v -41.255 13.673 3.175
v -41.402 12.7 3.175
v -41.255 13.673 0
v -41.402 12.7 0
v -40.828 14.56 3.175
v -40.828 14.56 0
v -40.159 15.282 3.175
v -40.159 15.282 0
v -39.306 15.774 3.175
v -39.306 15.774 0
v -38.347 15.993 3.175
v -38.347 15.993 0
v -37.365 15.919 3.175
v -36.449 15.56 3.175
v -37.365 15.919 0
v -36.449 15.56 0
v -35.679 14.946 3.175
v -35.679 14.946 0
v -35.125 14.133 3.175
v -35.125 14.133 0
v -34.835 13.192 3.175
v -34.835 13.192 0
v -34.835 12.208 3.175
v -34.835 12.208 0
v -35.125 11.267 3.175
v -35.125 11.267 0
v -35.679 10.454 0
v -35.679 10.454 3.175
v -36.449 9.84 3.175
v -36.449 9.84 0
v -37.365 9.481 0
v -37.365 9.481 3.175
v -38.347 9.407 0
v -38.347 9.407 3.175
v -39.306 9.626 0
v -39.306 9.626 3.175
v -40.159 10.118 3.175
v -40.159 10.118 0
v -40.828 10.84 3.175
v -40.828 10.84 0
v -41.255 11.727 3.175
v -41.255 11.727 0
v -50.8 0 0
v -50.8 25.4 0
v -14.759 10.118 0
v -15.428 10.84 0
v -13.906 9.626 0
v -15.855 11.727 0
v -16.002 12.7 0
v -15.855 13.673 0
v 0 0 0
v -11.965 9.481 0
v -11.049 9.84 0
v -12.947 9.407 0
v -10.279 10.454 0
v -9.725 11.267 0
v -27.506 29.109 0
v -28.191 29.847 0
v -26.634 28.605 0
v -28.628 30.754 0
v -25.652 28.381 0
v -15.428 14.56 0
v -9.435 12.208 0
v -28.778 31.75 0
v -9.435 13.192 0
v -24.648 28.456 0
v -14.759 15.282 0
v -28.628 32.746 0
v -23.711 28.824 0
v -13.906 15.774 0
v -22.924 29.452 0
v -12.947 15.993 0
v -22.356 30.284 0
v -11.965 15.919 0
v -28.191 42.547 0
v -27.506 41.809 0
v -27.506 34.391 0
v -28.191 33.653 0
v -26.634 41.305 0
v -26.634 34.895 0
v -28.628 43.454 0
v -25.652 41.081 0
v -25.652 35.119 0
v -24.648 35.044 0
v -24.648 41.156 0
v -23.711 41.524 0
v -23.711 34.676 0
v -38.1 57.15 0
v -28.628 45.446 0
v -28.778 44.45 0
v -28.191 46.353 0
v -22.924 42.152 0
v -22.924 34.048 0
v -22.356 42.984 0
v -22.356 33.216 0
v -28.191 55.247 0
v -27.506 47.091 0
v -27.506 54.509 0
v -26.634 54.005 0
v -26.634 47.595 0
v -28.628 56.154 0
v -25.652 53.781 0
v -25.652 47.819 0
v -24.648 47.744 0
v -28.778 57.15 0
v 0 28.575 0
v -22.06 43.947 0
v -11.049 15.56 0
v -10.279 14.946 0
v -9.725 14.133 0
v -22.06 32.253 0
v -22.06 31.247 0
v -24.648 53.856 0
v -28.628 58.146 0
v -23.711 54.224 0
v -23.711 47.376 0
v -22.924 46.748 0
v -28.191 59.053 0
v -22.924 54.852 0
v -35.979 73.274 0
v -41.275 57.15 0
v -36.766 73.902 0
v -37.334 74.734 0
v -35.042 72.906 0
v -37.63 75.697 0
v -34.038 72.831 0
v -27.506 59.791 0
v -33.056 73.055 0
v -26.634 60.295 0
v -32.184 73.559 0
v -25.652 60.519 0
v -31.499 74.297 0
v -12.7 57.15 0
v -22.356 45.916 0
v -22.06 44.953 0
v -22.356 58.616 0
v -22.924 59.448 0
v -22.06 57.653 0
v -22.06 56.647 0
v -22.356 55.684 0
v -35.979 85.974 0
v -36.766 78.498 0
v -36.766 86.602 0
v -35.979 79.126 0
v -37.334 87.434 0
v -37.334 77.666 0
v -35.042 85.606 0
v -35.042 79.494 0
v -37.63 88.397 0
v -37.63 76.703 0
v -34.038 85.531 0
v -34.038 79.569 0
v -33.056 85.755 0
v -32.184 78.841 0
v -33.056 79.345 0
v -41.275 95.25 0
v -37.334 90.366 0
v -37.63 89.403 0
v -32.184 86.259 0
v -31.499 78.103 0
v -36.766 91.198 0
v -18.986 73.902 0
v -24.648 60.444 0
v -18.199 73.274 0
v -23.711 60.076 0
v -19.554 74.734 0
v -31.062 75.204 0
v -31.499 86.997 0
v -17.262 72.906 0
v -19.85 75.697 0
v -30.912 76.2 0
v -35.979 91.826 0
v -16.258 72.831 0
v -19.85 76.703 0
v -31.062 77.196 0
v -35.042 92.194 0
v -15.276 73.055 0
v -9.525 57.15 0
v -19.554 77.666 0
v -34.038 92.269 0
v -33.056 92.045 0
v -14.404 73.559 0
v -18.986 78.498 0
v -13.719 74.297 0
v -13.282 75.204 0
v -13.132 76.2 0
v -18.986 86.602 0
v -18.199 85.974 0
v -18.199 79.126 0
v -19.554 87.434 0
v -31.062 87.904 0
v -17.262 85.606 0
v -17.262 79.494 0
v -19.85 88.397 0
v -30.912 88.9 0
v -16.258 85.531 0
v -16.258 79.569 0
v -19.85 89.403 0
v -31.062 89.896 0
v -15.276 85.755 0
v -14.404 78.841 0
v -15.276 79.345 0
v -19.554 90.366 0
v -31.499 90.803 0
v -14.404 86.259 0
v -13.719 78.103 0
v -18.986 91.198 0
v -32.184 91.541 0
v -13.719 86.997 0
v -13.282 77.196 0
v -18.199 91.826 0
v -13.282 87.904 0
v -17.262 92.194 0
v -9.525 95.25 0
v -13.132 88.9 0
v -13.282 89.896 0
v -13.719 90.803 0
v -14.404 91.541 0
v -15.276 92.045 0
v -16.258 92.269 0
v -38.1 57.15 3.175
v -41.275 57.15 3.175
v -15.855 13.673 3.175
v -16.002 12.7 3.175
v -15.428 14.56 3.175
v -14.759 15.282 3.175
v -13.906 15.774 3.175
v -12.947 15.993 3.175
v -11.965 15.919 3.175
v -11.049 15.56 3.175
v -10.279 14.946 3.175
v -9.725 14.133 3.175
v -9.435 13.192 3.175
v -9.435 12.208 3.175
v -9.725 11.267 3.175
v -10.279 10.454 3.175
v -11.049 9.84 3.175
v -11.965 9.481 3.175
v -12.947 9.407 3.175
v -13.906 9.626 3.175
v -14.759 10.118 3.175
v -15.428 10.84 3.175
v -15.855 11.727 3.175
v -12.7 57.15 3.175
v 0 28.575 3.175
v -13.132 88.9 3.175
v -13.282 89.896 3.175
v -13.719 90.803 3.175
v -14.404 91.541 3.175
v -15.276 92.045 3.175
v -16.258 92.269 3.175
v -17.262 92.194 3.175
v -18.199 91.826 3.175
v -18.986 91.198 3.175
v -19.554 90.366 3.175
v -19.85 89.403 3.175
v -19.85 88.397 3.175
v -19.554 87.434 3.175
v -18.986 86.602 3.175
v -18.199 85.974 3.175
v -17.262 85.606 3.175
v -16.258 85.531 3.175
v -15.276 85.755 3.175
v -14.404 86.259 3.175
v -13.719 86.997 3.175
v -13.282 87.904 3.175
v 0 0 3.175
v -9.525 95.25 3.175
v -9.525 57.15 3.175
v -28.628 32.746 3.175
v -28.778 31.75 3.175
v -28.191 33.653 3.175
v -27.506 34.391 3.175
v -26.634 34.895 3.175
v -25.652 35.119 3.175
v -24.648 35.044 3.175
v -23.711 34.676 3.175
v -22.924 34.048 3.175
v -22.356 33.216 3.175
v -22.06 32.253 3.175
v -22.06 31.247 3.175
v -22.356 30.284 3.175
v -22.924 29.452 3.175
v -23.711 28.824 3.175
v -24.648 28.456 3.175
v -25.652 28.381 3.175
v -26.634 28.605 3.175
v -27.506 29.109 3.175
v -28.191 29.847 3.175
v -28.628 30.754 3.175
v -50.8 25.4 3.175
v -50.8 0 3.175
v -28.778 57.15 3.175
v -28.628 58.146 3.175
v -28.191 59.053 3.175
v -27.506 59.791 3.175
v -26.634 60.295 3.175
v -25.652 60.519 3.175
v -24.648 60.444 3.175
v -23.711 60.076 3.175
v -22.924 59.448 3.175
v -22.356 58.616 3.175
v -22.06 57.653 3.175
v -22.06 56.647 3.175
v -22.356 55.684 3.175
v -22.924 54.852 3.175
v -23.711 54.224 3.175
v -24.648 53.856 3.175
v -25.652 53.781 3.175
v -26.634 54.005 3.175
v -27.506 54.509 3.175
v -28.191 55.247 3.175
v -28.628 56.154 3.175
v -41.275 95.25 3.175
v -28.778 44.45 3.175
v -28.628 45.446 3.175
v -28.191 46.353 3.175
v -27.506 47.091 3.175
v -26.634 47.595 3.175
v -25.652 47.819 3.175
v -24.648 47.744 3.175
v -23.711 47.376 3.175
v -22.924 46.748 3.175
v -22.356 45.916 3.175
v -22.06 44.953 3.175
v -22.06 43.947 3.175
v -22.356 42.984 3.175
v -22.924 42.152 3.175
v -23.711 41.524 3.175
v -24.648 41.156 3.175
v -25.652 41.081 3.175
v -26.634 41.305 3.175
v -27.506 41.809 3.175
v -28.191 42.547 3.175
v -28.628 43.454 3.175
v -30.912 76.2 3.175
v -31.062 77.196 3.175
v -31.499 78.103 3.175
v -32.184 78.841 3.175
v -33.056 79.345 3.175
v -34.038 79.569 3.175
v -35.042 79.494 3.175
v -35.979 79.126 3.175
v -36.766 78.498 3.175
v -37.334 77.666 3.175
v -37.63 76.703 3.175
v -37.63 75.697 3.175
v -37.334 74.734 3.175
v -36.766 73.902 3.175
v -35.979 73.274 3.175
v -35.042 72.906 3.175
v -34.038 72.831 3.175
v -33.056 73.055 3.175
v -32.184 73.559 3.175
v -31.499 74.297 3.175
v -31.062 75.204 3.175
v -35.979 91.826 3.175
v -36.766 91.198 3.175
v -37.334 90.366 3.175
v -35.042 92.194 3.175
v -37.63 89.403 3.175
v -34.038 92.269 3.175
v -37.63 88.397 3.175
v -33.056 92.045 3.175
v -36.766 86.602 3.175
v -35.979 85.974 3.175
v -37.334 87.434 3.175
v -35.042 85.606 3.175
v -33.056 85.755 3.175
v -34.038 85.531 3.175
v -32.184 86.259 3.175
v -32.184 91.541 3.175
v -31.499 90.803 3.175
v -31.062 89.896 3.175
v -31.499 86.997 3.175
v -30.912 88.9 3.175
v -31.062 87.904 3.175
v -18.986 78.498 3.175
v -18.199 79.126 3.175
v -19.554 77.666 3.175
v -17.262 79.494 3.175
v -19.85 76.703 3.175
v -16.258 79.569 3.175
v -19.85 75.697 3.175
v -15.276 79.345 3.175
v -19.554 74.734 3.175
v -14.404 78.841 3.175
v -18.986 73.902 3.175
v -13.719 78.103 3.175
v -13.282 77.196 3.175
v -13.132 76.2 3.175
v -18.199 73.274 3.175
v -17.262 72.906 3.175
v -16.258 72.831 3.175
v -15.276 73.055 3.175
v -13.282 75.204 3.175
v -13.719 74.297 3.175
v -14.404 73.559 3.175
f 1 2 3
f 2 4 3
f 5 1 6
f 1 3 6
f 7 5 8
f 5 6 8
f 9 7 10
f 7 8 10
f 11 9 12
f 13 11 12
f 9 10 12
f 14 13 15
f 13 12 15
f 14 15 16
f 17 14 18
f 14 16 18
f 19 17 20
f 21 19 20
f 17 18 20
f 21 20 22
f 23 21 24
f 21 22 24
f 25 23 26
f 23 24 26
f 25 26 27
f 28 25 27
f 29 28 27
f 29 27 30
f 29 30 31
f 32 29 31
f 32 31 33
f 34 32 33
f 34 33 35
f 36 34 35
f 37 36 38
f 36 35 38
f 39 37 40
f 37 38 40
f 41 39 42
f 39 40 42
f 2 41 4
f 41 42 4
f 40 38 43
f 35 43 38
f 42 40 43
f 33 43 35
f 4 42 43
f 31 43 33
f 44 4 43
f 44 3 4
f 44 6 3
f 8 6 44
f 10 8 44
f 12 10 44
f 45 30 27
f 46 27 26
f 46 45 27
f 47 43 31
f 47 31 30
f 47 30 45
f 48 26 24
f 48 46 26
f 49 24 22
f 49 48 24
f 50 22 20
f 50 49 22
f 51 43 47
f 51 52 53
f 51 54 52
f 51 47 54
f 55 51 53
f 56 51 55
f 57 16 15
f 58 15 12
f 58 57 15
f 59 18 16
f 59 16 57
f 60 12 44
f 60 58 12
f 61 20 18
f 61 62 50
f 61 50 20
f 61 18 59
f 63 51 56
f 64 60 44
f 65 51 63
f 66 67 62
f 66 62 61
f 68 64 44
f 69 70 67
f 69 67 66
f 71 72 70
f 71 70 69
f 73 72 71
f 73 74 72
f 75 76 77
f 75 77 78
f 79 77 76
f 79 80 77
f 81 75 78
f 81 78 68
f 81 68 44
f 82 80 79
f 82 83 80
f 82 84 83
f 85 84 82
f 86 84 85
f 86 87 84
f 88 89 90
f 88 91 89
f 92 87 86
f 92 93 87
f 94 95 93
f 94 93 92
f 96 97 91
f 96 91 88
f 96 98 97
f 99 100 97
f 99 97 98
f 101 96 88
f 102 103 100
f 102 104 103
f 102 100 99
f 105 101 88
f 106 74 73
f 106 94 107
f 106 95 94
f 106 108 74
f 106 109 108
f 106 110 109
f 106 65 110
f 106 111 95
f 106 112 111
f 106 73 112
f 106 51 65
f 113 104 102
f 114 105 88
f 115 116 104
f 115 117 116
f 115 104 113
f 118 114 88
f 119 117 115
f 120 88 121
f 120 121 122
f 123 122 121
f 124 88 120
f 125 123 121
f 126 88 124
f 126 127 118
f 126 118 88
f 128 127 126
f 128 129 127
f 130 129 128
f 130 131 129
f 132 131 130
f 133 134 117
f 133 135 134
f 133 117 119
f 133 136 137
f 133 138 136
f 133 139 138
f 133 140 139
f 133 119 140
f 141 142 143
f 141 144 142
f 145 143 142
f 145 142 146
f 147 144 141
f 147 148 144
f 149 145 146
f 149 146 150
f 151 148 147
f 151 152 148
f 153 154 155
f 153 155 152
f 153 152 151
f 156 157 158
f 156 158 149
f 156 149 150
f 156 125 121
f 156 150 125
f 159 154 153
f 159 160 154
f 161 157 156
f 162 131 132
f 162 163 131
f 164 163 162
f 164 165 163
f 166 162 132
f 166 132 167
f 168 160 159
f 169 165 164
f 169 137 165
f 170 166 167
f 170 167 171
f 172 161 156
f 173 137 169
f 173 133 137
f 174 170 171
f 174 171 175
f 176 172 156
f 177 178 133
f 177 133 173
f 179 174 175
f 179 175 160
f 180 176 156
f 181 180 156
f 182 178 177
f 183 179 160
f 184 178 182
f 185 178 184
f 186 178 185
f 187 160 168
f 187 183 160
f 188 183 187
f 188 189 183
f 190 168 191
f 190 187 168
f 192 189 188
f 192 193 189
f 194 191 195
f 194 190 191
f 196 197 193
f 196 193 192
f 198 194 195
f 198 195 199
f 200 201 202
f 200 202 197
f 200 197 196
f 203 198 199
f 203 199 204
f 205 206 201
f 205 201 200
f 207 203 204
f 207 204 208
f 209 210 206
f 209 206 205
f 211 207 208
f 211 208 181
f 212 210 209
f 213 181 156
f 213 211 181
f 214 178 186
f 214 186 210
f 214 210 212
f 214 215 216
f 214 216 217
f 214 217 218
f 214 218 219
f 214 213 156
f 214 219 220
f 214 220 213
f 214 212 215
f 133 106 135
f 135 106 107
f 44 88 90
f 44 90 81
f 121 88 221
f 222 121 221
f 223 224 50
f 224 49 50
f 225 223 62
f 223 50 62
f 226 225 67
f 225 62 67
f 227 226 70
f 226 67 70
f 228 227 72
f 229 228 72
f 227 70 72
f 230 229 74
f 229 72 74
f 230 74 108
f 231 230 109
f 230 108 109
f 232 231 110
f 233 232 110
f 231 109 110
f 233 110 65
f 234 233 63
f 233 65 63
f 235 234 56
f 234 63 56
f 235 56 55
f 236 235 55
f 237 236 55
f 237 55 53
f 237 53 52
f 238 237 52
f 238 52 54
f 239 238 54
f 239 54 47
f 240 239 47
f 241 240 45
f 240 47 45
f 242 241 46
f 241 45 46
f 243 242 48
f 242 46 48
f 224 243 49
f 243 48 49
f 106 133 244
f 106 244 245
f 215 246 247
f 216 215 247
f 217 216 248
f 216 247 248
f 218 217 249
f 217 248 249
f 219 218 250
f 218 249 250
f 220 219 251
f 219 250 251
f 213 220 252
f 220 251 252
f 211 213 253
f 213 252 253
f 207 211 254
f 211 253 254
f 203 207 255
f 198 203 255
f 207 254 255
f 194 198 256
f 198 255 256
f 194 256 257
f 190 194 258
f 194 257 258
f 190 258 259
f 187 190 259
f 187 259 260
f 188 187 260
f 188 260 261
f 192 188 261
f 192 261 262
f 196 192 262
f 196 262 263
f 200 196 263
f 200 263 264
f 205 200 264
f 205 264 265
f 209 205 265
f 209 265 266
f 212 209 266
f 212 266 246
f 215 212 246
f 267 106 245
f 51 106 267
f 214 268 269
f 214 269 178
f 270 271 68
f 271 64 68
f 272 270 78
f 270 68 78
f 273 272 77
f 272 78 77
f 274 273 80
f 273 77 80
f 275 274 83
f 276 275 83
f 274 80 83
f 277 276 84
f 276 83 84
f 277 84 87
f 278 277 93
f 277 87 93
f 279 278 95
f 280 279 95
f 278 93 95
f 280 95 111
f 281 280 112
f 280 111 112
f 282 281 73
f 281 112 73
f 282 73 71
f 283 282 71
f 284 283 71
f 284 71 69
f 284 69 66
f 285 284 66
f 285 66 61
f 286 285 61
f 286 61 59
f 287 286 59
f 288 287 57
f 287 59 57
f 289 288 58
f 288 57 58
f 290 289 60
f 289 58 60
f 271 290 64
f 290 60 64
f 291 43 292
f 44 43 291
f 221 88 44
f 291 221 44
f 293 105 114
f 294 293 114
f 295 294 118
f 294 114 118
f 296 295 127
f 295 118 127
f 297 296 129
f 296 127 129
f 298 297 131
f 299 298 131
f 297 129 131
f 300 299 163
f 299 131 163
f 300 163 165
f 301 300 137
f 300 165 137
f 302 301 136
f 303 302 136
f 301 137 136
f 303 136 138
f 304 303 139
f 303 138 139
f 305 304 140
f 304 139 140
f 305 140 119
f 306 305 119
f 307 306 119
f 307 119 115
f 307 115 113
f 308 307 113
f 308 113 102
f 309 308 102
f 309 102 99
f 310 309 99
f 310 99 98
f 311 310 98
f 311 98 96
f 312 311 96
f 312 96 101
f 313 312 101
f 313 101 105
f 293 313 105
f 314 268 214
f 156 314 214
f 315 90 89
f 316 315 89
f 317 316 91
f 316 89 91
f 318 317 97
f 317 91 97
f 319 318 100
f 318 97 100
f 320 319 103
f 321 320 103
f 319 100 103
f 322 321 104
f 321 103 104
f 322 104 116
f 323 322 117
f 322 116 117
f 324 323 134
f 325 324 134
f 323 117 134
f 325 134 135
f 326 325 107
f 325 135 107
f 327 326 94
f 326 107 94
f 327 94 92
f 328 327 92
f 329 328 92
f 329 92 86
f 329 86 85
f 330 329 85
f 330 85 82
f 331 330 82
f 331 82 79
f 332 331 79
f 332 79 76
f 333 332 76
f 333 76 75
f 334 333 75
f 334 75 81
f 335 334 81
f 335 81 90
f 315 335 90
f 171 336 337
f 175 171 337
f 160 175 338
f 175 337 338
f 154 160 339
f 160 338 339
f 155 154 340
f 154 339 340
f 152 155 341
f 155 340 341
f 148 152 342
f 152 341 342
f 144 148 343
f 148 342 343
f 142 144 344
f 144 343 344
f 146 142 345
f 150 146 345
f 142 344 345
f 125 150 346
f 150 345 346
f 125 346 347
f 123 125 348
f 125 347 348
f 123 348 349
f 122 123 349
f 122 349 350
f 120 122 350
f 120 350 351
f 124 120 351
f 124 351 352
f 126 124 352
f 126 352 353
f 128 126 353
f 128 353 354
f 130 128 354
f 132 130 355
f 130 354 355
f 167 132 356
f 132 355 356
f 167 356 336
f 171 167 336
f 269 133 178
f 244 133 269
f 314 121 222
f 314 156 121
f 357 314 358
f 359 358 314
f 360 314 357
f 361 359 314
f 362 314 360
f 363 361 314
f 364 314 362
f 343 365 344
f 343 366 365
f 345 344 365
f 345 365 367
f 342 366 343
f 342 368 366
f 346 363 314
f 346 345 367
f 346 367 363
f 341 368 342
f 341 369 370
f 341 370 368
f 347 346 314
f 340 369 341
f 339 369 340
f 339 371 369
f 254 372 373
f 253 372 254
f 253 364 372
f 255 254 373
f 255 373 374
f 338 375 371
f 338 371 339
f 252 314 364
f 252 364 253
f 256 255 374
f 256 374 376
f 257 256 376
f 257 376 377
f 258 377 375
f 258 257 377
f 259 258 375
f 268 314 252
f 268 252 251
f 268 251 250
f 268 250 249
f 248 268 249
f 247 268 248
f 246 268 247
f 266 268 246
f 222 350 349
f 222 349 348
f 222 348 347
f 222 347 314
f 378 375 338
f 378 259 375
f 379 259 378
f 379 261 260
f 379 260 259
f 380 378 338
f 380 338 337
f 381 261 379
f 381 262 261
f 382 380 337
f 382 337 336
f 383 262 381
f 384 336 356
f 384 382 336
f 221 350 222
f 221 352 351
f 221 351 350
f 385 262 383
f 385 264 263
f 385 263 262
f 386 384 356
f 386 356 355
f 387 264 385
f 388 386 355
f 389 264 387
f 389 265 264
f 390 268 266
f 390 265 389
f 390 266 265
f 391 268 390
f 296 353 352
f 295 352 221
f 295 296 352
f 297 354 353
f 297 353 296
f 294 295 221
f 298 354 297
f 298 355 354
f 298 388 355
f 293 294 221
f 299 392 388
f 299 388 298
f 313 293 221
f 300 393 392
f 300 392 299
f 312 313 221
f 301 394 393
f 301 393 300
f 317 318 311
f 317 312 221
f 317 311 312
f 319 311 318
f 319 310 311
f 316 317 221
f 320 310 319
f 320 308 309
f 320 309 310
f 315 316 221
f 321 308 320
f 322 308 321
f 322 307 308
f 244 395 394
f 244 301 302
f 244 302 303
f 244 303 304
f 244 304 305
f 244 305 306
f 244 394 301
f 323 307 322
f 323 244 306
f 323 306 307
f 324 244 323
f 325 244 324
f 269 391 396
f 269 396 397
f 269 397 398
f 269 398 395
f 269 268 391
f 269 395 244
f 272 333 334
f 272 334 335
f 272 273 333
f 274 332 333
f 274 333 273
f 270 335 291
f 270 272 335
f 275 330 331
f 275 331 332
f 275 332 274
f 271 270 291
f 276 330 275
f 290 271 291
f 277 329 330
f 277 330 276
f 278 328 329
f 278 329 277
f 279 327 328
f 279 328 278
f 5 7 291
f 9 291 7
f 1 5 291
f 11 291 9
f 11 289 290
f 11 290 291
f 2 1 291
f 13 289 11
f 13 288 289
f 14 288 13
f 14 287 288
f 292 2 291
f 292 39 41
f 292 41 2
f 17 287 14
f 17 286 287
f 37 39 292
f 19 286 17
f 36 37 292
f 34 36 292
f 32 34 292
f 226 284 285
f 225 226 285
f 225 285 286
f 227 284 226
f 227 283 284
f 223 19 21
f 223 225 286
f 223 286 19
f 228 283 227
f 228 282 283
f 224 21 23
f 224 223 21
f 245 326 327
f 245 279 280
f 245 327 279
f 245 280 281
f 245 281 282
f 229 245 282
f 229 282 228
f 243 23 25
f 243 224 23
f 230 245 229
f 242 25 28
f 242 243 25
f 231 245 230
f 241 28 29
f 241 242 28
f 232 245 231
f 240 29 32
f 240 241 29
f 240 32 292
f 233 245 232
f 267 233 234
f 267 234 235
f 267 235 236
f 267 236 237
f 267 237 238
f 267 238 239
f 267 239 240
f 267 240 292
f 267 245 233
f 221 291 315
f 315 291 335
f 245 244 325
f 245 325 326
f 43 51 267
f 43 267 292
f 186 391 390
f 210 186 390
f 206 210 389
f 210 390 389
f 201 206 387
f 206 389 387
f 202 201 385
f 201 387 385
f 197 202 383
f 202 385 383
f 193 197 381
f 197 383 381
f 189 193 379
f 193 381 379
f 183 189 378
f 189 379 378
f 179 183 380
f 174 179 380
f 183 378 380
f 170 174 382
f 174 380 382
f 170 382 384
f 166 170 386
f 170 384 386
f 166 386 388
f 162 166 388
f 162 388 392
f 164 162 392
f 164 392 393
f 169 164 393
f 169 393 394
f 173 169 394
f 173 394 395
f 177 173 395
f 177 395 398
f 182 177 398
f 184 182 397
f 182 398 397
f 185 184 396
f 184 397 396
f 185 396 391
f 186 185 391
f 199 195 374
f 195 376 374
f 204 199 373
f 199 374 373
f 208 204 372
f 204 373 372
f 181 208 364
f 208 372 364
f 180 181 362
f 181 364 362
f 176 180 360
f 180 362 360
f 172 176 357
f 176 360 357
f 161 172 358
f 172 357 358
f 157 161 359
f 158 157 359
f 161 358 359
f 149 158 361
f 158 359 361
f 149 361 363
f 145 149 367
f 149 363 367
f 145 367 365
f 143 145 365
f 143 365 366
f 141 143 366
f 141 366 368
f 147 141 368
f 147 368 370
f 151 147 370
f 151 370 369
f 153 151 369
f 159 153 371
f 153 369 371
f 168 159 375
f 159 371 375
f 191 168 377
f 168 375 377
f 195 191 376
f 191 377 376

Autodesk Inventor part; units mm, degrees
ref_plane "YZ Plane" through (0, 0, 0) normal (1, 0, 0) x (0, 1, 0)
ref_plane "XZ Plane" through (0, 0, 0) normal (0, 1, 0) x (-1, 0, 0)
ref_plane "XY Plane" through (0, 0, 0) normal (0, 0, 1) x (1, 0, 0)
sketch "Sketch1" plane through (0, 0, 0) normal (0, 0, 1) x (1, 0, 0)
  line L0 (0, 0) -> (-50.8, 0)
  line L1 (-50.8, 0) -> (-50.8, 57.15)
  line L2 (-50.8, 57.15) -> (0, 57.15)
  line L3 (0, 57.15) -> (0, 0)
  line L4 (-50.8, 0) -> (-50.8, 25.4)
  line L5 (0, 0) -> (0, 25.4)
  line L6 (-25.4, 57.15) -> (-38.1, 57.15)
  line L7 (-25.4, 57.15) -> (-12.7, 57.15)
  line L8 (-12.7, 57.15) -> (0, 28.575)
  line L9 (-38.1, 57.15) -> (-50.8, 25.4)
  dimension "d0" = 50.8
  dimension "d1" = 57.15
  dimension "d2" = 25.4
  dimension "d3" = 12.7
  dimension "d4" = 12.7
extrude "Extrusion1" add sketch "Sketch1" along normal blind 3.175 contours L0 L1 L9 L2 L8 L3
sketch "Sketch2" plane through (0, 0, 3.175) normal (0, 0, 1) x (1, 0, 0)
  line L0 (-12.7, 57.15) -> (-38.1, 57.15) projected
  line L1 (-50.8, 0) -> (0, 0) projected
  line L2 (-38.1, 57.15) -> (-38.1, 95.25)
  line L3 (-38.1, 95.25) -> (-12.7, 95.25)
  line L4 (-12.7, 95.25) -> (-12.7, 57.15)
  dimension "d7" = 38.1
extrude "Extrusion2" add sketch "Sketch2" against normal blind 3.175
sketch "Sketch3" plane through (0, 0, 0) normal (0, 0, -1) x (-1, 0, 0)
  circle A0 centre (25.4, 57.15) radius 3.3782 projected
  circle A1 centre (25.4, 44.45) radius 3.3782 projected
  circle A2 centre (25.4, 31.75) radius 3.3782 projected
  circle A3 centre (12.7, 12.7) radius 3.302 projected
  circle A4 centre (38.1, 12.7) radius 3.302 projected
extrude "Extrusion3" cut sketch "Sketch3" against normal blind 3.175
sketch "Sketch4" plane through (0, 0, 3.175) normal (0, 0, 1) x (1, 0, 0)
  line L0 (-12.7, 95.25) -> (-38.1, 95.25) projected
  line L1 (-38.1, 95.25) -> (-34.29, 95.25)
  line L2 (-34.29, 95.25) -> (-34.29, 88.9)
  line L3 (-34.29, 88.9) -> (-34.29, 76.2)
  line L4 (-12.7, 95.25) -> (-16.51, 95.25)
  line L5 (-16.51, 95.25) -> (-16.51, 88.9)
  line L6 (-16.51, 88.9) -> (-16.51, 82.55)
  circle A0 centre (-34.29, 88.9) radius 3.3782
  circle A1 centre (-16.51, 88.9) radius 3.3782
  circle A2 centre (-34.29, 76.2) radius 3.3782
  line L7 (-16.51, 88.9) -> (-16.51, 76.2)
  circle A3 centre (-16.51, 76.2) radius 3.3782
  dimension "d12" = 3.81
  dimension "d13" = 6.35
  dimension "d14" = 12.7
  dimension "d15" = 3.81
  dimension "d16" = 6.7564
  dimension "d17" = 6.7564
  dimension "d18" = 6.7564
  dimension "d19" = 6.7564
extrude "Extrusion4" cut sketch "Sketch4" against normal blind 25.4
sketch "Sketch5" plane through (-12.7, 57.15, 3.175) normal (1, 0, 0) x (0, 0, -1)
  line L0 (0, 0) -> (0, 38.1) projected
  line L1 (3.175, 0) -> (0, 0) projected
  line L2 (3.175, 38.1) -> (3.175, 0) projected
  line L3 (0, 38.1) -> (3.175, 38.1) projected
  point P0 (3.175, -57.15)
extrude "Extrusion5" add sketch "Sketch5" along normal blind 3.175
sketch "Sketch6" plane through (-38.1, 57.15, 3.175) normal (-1, 0, 0) x (0, 0, 1)
  line L0 (0, 38.1) -> (0, 0) projected
  line L1 (0, 38.1) -> (-3.175, 38.1) projected
  line L2 (-3.175, 0) -> (-3.175, 38.1) projected
  line L3 (-3.175, 0) -> (0, 0) projected
  point P0 (-3.175, -57.15)
extrude "Extrusion6" add sketch "Sketch6" along normal blind 3.175
properties part number "that thing mount" material "Aluminum 6061"
